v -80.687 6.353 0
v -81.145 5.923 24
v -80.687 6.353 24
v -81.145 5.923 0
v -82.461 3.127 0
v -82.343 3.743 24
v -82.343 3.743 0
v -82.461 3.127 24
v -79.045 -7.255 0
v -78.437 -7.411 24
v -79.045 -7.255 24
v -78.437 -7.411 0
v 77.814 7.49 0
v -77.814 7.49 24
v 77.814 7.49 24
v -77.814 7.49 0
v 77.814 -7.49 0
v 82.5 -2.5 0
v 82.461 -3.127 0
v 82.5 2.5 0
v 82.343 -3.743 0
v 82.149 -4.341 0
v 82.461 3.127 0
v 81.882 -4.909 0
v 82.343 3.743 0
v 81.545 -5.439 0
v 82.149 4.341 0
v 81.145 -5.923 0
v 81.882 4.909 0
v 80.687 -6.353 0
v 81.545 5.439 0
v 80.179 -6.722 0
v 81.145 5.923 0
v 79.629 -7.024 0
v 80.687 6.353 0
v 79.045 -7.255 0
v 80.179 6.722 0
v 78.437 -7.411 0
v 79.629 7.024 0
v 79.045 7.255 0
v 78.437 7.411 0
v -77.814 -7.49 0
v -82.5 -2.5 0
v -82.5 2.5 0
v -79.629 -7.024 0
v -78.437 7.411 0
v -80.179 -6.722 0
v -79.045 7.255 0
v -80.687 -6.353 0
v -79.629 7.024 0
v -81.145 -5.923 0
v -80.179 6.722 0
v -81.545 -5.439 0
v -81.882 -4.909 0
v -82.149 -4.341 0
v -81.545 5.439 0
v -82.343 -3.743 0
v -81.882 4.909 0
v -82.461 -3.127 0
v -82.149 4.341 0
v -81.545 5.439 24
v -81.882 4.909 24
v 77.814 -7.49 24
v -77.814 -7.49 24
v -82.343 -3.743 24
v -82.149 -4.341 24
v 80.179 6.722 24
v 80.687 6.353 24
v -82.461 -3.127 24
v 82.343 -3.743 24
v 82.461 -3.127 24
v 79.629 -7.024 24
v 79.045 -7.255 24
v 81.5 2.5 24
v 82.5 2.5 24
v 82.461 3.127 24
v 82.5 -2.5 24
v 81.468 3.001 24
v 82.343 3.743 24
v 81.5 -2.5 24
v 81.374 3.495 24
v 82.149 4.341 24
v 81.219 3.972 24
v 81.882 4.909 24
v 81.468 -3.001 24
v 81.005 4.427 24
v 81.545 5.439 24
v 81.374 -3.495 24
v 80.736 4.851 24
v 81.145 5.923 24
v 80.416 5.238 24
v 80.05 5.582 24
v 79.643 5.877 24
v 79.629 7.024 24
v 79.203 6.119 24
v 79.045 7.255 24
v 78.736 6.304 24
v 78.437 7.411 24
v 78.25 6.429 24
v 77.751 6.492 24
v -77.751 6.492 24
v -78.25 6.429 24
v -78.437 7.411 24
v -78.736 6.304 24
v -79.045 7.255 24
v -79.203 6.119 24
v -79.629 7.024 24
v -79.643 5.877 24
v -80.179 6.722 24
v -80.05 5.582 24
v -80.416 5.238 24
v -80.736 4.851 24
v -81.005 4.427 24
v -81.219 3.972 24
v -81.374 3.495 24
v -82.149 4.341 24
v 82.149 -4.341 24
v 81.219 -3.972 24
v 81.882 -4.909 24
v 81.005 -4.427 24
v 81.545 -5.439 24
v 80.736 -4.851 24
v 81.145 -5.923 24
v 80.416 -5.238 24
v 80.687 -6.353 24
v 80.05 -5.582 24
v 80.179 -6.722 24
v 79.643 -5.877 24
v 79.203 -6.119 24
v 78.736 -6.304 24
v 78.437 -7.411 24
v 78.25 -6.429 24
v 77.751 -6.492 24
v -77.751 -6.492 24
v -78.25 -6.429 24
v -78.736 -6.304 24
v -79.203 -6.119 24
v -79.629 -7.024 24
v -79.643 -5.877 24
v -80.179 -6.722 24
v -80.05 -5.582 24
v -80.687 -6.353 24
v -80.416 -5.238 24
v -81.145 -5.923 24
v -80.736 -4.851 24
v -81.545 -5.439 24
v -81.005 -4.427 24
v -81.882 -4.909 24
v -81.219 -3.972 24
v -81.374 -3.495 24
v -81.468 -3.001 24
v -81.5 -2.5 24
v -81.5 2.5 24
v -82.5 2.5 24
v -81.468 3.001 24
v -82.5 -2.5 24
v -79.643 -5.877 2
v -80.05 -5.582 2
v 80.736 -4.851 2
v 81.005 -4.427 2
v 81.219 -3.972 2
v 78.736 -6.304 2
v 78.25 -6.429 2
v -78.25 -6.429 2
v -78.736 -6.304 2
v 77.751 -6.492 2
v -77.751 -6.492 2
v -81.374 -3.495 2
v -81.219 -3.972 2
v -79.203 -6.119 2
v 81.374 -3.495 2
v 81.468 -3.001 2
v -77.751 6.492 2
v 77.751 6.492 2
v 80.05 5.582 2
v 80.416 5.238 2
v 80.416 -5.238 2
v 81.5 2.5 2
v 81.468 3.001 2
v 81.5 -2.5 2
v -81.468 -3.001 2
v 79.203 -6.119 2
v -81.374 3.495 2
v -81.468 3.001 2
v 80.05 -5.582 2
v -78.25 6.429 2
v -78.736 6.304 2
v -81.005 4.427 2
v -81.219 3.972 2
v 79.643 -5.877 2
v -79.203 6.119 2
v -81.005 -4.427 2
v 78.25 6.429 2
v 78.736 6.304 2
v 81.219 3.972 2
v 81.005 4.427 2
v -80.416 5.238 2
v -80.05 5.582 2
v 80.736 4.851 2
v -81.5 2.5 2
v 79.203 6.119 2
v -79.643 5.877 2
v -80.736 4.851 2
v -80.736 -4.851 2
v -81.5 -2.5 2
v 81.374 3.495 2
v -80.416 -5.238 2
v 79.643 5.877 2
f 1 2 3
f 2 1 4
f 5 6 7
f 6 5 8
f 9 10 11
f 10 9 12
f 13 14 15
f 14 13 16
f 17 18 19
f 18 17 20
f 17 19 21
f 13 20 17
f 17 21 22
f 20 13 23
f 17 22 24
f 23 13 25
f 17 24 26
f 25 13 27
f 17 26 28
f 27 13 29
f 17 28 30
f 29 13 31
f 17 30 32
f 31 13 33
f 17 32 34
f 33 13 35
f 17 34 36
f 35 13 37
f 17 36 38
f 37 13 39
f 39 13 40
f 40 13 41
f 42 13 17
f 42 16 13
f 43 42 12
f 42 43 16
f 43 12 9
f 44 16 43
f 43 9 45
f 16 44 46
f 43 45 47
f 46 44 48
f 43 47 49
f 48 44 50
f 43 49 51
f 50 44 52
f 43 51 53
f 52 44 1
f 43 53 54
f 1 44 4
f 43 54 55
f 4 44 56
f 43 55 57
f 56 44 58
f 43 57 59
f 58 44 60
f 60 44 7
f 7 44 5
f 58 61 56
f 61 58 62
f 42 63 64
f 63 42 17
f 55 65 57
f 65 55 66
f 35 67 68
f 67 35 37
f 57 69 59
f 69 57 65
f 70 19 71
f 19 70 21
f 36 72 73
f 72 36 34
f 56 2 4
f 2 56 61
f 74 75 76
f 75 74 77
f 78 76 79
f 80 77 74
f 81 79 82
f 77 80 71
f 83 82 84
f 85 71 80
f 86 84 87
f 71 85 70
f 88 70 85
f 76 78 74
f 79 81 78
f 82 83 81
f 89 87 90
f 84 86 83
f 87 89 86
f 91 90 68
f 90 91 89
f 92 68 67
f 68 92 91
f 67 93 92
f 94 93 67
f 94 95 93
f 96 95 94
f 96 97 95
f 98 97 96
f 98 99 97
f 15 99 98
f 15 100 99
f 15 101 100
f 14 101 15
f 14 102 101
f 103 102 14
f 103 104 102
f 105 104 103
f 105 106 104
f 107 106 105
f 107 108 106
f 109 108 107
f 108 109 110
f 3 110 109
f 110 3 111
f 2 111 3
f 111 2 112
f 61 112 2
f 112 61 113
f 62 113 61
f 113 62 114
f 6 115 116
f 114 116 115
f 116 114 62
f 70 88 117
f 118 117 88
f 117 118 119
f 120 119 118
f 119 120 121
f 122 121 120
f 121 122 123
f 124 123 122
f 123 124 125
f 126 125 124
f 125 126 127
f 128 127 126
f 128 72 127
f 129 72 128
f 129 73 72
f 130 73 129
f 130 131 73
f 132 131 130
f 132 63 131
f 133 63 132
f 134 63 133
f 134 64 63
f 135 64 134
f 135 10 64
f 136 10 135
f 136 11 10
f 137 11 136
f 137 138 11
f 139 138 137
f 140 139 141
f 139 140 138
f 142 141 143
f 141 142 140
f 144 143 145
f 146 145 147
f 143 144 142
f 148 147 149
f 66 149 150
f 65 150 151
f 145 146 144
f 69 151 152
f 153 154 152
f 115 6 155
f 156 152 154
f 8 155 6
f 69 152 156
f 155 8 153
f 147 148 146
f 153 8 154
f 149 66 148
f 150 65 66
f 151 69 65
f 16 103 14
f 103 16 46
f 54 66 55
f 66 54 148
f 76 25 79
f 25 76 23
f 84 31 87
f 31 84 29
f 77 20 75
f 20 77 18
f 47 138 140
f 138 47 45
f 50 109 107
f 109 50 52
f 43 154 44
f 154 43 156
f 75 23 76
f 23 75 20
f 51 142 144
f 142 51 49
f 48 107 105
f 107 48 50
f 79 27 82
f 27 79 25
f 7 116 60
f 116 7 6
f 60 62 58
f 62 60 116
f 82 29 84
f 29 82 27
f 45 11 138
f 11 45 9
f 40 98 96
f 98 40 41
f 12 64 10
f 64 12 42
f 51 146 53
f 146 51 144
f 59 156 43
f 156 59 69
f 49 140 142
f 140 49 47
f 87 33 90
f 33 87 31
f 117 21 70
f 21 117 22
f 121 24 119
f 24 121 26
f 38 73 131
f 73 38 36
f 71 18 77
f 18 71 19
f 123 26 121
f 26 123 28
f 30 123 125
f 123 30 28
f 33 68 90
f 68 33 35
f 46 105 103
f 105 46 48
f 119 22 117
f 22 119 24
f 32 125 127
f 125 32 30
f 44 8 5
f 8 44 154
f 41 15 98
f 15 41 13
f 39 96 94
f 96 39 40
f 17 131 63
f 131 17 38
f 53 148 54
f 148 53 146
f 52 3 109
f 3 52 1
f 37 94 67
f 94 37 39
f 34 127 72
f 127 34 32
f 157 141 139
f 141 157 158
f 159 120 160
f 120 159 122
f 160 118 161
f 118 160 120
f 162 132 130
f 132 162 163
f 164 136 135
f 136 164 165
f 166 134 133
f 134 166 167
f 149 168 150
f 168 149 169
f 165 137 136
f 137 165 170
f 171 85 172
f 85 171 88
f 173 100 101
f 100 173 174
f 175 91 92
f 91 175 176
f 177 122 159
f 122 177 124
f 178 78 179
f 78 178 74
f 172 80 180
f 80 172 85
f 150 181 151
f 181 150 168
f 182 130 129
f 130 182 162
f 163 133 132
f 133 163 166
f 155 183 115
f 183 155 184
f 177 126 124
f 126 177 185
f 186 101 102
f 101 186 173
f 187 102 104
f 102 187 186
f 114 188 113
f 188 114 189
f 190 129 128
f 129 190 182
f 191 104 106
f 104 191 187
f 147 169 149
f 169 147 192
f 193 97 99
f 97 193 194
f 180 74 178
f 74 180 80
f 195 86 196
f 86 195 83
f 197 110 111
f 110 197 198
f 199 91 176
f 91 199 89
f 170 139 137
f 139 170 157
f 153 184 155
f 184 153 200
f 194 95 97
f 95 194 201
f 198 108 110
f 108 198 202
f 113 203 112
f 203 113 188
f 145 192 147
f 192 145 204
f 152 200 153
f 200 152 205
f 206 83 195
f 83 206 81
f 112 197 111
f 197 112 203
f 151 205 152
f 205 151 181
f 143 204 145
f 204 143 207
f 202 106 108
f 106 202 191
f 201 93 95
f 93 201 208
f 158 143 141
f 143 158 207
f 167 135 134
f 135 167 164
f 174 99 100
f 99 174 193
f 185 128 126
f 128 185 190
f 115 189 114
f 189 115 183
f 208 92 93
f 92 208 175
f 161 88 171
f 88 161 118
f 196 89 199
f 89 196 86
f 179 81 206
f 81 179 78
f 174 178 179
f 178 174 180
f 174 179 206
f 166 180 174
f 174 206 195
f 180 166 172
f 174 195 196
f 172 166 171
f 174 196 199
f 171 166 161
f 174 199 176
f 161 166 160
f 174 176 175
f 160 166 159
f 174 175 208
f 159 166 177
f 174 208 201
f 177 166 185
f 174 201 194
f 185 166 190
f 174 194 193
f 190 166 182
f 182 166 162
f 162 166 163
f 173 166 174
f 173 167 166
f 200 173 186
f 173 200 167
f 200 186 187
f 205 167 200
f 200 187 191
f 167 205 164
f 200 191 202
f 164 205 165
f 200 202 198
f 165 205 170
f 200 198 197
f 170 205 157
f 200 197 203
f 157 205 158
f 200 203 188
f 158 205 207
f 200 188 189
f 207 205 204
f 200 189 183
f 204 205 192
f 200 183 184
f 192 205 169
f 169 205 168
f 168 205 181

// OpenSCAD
$fn = 50;


difference() {
	union() {
		hull() {
			translate(v = [-77.5000000000, 2.5000000000, 0]) {
				cylinder(h = 24, r = 5);
			}
			translate(v = [77.5000000000, 2.5000000000, 0]) {
				cylinder(h = 24, r = 5);
			}
			translate(v = [-77.5000000000, -2.5000000000, 0]) {
				cylinder(h = 24, r = 5);
			}
			translate(v = [77.5000000000, -2.5000000000, 0]) {
				cylinder(h = 24, r = 5);
			}
		}
	}
	union() {
		translate(v = [0, 0, 2]) {
			hull() {
				translate(v = [-77.5000000000, 2.5000000000, 0]) {
					cylinder(h = 22, r = 4);
				}
				translate(v = [77.5000000000, 2.5000000000, 0]) {
					cylinder(h = 22, r = 4);
				}
				translate(v = [-77.5000000000, -2.5000000000, 0]) {
					cylinder(h = 22, r = 4);
				}
				translate(v = [77.5000000000, -2.5000000000, 0]) {
					cylinder(h = 22, r = 4);
				}
			}
		}
	}
}
